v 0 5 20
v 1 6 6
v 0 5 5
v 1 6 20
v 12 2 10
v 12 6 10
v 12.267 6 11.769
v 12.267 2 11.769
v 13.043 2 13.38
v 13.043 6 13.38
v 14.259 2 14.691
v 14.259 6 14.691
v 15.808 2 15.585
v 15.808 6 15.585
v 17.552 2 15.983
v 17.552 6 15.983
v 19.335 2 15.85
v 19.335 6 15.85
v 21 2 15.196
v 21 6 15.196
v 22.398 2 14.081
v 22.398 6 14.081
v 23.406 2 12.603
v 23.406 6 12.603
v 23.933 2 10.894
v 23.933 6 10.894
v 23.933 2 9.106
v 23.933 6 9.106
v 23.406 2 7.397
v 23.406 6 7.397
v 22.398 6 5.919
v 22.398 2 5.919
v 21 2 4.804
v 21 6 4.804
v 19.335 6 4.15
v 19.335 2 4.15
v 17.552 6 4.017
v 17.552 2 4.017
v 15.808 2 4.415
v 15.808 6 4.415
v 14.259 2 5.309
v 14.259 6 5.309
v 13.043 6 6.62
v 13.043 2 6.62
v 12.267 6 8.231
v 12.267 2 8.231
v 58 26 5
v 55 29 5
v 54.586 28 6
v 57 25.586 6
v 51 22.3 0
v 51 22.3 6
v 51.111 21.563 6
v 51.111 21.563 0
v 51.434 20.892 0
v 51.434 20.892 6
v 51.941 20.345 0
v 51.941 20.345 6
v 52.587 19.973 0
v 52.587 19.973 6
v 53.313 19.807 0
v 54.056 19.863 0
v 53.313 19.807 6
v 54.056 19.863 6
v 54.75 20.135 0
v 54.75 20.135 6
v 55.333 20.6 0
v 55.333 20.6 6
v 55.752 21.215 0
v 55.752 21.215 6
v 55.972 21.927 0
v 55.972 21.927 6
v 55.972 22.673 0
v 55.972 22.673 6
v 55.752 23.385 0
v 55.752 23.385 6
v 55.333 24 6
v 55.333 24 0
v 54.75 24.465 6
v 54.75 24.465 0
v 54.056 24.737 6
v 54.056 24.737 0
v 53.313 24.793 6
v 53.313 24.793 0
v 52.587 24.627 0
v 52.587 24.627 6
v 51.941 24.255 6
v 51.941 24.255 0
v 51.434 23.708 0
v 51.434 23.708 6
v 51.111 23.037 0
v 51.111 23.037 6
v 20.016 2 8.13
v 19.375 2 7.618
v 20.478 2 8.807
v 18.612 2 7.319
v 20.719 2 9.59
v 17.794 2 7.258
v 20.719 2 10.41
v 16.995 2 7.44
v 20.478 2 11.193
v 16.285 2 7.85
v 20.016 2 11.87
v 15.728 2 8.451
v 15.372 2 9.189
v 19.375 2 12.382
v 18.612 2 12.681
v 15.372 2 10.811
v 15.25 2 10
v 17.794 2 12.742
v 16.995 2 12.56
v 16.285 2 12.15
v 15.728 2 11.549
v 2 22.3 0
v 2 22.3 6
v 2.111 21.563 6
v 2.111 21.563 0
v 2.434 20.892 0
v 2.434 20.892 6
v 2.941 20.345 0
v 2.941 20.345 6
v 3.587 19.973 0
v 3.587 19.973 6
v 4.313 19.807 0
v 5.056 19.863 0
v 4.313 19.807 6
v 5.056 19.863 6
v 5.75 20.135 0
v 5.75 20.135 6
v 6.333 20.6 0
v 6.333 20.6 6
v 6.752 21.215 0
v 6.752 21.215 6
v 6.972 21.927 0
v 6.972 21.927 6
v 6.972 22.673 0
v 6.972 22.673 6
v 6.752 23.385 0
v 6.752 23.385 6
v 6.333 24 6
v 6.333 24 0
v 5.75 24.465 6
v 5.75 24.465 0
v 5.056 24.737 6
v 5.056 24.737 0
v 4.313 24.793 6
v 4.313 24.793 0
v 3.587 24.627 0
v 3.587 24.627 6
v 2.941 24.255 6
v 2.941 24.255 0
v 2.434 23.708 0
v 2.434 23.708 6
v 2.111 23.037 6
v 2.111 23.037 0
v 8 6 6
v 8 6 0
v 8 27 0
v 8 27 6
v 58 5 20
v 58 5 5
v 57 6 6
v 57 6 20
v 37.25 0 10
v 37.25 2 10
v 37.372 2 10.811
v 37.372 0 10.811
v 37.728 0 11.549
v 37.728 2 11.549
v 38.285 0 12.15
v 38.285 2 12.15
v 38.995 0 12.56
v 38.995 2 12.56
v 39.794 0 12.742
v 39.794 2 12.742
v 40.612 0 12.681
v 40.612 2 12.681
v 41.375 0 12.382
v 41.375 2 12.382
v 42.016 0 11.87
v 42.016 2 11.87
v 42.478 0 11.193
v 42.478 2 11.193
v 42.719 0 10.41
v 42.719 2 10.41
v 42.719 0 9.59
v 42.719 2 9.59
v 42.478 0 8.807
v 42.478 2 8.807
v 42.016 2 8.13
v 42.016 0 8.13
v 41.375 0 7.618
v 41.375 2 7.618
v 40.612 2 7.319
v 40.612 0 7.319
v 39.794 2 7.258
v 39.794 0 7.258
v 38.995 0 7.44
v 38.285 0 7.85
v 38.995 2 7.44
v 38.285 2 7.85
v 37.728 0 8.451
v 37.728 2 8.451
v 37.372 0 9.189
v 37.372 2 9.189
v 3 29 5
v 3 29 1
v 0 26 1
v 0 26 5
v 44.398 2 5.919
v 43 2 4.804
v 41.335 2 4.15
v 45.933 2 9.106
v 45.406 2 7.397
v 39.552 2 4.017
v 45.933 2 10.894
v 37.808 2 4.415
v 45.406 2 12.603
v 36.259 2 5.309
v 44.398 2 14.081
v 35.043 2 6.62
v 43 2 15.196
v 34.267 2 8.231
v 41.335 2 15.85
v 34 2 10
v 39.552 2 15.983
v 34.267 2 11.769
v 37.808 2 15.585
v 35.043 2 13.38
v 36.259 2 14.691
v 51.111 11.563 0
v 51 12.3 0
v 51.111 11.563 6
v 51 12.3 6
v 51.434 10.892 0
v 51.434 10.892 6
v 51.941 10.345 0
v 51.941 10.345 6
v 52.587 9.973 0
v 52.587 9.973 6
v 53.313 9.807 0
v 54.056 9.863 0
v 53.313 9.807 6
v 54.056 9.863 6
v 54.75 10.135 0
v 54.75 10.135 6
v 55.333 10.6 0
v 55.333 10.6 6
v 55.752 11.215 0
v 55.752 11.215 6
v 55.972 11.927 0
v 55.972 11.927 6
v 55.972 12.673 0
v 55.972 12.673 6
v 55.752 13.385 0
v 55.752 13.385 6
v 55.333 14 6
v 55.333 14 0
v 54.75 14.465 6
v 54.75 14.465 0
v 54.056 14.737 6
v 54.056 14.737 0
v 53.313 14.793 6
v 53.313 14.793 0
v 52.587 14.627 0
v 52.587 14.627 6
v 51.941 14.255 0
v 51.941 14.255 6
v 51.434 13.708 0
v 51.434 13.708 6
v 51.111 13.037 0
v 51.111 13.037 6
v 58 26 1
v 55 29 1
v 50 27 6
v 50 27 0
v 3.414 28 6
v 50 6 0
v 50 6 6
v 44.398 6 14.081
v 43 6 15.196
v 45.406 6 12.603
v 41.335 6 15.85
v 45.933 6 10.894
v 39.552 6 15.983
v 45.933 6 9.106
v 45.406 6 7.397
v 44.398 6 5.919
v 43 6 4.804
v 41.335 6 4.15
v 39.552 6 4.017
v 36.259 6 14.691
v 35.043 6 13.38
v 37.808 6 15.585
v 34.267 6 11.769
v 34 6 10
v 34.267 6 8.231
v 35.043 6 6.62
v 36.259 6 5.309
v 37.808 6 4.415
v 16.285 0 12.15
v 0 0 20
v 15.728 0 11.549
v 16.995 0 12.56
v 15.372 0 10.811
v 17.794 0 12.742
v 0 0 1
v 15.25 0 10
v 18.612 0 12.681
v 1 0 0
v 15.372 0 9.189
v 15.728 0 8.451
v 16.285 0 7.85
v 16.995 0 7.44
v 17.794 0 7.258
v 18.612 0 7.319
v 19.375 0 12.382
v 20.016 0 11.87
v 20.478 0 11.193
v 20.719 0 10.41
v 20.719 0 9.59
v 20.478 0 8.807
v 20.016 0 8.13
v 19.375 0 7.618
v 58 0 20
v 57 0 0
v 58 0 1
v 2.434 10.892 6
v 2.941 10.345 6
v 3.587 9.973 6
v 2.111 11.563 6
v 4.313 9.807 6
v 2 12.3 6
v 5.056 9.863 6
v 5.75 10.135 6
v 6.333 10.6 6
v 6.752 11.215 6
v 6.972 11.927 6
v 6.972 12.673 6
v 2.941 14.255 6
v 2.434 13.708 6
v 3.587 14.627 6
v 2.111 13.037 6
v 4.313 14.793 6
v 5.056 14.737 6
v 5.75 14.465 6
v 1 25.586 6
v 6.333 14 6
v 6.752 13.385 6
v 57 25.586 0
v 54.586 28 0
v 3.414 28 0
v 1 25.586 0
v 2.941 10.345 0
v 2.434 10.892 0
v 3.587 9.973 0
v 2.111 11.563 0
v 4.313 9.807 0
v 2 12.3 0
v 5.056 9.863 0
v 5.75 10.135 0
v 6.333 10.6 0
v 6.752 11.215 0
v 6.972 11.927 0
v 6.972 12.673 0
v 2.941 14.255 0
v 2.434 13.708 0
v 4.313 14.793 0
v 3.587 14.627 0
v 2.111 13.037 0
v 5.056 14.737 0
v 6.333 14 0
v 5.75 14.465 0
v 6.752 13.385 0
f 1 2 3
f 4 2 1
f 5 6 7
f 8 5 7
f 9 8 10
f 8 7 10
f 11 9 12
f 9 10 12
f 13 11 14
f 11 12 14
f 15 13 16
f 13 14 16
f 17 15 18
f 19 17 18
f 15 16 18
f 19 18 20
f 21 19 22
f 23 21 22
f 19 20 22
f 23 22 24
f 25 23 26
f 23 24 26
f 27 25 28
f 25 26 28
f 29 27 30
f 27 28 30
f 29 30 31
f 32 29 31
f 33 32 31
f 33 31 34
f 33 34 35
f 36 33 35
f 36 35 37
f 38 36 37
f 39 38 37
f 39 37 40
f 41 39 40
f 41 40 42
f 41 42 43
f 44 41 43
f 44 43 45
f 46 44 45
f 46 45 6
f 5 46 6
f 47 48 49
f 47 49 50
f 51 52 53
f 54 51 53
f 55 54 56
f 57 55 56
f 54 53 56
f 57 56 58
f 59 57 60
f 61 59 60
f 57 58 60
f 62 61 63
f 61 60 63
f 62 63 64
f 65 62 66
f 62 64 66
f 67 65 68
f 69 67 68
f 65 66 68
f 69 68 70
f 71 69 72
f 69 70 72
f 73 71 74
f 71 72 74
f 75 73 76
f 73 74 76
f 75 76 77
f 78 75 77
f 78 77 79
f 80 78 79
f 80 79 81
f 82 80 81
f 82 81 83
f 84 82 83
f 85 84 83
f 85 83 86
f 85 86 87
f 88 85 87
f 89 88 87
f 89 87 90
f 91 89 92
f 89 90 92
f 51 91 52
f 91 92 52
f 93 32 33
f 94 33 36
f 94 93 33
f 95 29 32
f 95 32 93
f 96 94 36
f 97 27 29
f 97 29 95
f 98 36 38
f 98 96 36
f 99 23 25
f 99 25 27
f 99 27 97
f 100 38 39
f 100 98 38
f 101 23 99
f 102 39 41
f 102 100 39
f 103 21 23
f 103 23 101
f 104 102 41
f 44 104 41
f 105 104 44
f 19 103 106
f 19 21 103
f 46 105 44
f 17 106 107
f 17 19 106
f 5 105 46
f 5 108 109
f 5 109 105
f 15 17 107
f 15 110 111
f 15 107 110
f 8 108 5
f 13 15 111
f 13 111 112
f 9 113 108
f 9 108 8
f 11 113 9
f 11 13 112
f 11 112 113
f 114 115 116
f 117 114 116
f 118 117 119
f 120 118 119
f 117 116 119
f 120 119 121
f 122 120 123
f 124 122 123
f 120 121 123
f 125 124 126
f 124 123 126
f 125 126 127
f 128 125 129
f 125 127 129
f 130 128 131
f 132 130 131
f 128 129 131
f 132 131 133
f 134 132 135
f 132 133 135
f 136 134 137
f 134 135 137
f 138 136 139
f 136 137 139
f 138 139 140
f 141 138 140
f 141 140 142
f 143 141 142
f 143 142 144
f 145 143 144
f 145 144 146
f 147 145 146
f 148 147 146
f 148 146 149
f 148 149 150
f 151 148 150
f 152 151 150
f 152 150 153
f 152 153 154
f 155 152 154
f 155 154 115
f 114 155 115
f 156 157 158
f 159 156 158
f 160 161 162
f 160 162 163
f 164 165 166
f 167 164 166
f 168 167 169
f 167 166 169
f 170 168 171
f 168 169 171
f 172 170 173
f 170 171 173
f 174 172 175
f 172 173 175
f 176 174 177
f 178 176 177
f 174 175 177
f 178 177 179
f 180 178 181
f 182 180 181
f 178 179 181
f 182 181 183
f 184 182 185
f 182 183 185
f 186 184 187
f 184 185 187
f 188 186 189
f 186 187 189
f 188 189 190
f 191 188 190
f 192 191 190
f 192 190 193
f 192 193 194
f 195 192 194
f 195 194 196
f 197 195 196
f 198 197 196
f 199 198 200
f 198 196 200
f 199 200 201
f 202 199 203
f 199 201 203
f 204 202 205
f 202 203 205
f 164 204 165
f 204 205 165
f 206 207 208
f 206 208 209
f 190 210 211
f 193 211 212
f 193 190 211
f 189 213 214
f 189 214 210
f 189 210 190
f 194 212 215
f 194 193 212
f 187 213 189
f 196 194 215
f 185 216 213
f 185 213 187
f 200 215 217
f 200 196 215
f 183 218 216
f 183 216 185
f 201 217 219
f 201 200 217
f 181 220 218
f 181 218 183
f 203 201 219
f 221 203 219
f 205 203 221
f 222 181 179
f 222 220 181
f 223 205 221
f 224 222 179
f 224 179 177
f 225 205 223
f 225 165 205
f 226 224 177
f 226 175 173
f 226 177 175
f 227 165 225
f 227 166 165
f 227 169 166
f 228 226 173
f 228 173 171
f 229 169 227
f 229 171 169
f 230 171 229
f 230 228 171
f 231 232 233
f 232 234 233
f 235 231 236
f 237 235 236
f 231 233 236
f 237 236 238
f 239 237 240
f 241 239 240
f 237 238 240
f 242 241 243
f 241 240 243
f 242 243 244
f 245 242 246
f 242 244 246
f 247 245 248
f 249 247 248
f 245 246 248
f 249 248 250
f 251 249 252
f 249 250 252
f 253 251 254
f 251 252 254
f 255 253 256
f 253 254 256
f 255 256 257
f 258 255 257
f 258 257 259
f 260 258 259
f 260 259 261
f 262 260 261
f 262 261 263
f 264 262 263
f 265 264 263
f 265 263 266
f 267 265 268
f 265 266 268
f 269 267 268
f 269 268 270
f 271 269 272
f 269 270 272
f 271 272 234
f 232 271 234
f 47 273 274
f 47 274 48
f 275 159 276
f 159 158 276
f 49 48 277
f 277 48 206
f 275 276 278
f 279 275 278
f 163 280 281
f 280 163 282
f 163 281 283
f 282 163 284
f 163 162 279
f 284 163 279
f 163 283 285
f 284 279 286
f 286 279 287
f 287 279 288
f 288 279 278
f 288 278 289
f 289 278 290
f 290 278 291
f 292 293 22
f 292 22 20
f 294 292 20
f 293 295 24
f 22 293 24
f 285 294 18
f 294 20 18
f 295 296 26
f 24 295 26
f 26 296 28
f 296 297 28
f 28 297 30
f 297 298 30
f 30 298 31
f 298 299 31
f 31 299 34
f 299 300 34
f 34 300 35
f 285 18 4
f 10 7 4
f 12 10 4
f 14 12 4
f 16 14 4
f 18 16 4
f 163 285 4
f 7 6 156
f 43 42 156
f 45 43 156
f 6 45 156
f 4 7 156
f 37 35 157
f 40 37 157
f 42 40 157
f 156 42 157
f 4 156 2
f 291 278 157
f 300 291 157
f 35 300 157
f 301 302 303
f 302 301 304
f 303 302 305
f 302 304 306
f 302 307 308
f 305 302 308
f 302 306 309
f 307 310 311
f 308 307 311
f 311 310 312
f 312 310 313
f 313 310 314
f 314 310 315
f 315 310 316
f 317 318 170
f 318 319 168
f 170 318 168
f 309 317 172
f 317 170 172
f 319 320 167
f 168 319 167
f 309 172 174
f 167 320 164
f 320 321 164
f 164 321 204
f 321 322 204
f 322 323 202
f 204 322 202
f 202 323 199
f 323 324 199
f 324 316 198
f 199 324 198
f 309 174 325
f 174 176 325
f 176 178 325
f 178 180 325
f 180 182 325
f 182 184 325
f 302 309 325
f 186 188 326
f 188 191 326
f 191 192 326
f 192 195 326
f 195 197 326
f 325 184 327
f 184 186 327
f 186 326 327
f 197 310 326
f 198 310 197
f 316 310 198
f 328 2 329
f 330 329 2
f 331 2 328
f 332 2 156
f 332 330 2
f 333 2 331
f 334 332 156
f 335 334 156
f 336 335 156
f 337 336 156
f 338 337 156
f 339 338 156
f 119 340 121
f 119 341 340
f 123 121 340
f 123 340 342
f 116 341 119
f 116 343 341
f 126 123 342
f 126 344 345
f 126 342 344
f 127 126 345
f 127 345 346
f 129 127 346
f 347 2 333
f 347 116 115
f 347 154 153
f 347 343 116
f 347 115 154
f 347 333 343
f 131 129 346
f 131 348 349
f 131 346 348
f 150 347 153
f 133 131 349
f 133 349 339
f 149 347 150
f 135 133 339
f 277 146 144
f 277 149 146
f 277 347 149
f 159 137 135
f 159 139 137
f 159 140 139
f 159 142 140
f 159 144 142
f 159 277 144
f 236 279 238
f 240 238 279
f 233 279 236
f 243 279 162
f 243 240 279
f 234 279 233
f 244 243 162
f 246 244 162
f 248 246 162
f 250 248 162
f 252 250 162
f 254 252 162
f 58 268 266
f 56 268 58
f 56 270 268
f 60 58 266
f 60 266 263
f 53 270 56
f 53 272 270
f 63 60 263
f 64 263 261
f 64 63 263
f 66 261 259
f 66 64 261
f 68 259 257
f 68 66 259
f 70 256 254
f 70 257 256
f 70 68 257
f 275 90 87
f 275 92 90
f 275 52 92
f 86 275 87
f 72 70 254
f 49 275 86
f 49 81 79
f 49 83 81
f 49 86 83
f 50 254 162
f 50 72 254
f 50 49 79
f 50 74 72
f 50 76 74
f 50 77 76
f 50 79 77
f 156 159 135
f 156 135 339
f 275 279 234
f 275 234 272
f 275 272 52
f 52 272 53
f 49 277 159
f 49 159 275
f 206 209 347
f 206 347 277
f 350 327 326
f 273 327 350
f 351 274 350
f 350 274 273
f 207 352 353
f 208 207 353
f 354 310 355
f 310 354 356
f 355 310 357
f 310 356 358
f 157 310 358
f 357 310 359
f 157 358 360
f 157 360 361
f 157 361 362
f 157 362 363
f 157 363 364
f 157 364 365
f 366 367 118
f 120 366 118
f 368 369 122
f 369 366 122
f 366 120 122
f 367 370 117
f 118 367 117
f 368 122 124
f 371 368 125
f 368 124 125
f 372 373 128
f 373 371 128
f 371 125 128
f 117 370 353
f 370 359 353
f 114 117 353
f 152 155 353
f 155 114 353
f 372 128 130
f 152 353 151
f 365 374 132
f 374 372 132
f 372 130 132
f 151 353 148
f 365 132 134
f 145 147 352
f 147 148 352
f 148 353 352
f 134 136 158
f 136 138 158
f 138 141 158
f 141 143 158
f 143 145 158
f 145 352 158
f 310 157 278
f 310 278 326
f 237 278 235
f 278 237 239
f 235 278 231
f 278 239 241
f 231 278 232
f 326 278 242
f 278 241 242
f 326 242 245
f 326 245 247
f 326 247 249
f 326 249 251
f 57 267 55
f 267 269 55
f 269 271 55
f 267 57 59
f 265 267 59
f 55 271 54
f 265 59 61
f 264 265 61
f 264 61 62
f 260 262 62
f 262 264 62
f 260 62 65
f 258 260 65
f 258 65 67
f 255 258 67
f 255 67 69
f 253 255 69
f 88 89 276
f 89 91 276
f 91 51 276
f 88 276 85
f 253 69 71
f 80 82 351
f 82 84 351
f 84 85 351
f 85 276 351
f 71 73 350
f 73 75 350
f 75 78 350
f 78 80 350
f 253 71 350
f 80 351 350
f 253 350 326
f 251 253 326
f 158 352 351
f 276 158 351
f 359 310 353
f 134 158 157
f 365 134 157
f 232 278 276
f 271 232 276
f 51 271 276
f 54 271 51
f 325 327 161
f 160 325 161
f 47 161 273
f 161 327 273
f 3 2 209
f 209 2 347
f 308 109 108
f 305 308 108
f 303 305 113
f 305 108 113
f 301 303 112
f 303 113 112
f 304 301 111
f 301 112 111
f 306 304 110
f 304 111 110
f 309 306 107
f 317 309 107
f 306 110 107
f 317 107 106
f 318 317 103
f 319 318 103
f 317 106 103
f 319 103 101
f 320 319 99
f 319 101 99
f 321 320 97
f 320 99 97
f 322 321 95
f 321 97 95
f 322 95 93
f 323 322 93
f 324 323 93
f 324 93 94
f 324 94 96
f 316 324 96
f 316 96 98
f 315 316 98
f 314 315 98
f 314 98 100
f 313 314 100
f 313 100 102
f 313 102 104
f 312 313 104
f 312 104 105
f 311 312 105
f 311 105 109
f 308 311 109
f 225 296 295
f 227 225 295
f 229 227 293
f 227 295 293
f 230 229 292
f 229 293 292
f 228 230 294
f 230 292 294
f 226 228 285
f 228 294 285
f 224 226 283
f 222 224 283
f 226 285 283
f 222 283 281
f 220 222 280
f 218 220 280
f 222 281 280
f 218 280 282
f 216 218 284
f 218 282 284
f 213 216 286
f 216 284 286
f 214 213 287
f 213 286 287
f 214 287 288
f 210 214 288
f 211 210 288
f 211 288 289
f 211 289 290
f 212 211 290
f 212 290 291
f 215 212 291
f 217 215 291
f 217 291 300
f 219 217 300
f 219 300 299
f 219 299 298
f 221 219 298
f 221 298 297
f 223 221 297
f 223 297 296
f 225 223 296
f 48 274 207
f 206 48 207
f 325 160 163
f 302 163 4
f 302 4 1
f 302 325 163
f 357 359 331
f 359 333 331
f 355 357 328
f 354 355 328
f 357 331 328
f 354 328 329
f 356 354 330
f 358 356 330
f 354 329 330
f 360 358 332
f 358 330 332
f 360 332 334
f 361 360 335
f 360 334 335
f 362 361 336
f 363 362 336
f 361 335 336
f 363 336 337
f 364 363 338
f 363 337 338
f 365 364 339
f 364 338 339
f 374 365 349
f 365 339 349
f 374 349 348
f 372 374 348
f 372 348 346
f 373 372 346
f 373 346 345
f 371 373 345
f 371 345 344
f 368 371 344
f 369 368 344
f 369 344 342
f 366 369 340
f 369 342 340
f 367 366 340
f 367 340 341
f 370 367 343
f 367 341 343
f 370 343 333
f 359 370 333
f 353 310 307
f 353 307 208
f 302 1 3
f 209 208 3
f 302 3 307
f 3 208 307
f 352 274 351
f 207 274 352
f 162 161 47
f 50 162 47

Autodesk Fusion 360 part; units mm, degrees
sketch "Sketch1" plane through (0, 0, 0) normal (0, 0, 1) x (1, 0, 0) in component "Servohalterung"
  line L0 (0, 0) -> (58, 0)
  line L1 (58, 0) -> (58, 29)
  line L2 (58, 29) -> (0, 29)
  line L3 (0, 29) -> (0, 0)
  line L4 (8, 27) -> (50, 27)
  line L5 (50, 27) -> (50, 6)
  line L6 (50, 6) -> (8, 6)
  line L7 (8, 6) -> (8, 27)
  dimension "d22" = 8
  dimension "d23" = 8
  dimension "d24" = 42
  dimension "d25" = 2
  dimension "d26" = 6
  dimension "d27" = 21
extrude "Extrude1" add sketch "Sketch1" along normal blind 6 in component "Servohalterung"
sketch "Sketch2" plane through (0, 0, 6) normal (0, 0, 1) x (-1, 0, 0) in component "Servohalterung"
  line L0 (-50, -6) -> (-8, -6)
  line L1 (-8, -6) -> (-8, -27)
  line L2 (-8, -27) -> (-50, -27)
  line L3 (-50, -27) -> (-50, -6)
  line L4 (0, -29) -> (0, 0)
  line L5 (0, 0) -> (-58, 0)
  line L6 (-58, 0) -> (-58, -29)
  line L7 (-58, -29) -> (0, -29)
  line L8 (0, 0) -> (-58, 0)
  line L9 (-58, 0) -> (-58, -6)
  line L10 (-58, -6) -> (0, -6)
  line L11 (0, -6) -> (0, 0)
  line L12 (-50, -6) -> (-8, -6)
extrude "Extrude2" add sketch "Sketch2" along normal blind 14 contours L0 L4 L5 L6 L8 L9 L10 L11 L12 in component "Servohalterung"
sketch "Sketch3" plane through (0, 6, 0) normal (0, 1, 0) x (-1, 0, 0) in component "Servohalterung"
  line L0 (-8, 0) -> (-8, 6)
  line L1 (-8, 6) -> (0, 6)
  line L2 (0, 6) -> (0, 20)
  line L3 (0, 20) -> (-58, 20)
  line L4 (-58, 20) -> (-58, 6)
  line L5 (-58, 6) -> (-50, 6)
  line L6 (-50, 6) -> (-50, 0)
  line L7 (-50, 0) -> (-8, 0)
  circle A0 centre (-40, 10) radius 6
  line L8 (-29, 0) -> (-29, 20)
  circle A1 centre (-18, 10) radius 6
  dimension "d34" = 12
  dimension "d38" = 10
  dimension "d64" = 10
extrude "Extrude3" cut sketch "Sketch3" against normal blind 4 contours A0 | A1 in component "Servohalterung"
sketch "Sketch4" plane through (0, 2, 0) normal (0, 1, 0) x (-1, 0, 0) in component "Servohalterung"
  circle A0 centre (-40, 10) radius 6
  circle A1 centre (-40, 10) radius 2.75
  line L0 (-28.3646, -4) -> (-28.3646, 24)
  circle A2 centre (-18, 10) radius 2.75
  circle A3 centre (-18, 10) radius 6
  line L1 (-58, 20) -> (0, 20)
  dimension "d42" = 5.5
  dimension "d43" = 5.5
extrude "Extrude4" cut sketch "Sketch4" against normal up to surface (2 mm away) contours A1 | A2 in component "Servohalterung"
sketch "Sketch5" plane through (0, 0, 6) normal (0, 0, 1) x (-1, 0, 0) in component "Servohalterung"
  line L0 (0, -6) -> (-8, -6)
  line L1 (-8, -6) -> (-8, -27)
  line L2 (-8, -27) -> (-50, -27)
  line L3 (-50, -27) -> (-50, -6)
  line L4 (-50, -6) -> (-58, -6)
  line L5 (-58, -6) -> (-58, -29)
  line L6 (-58, -29) -> (0, -29)
  line L7 (0, -29) -> (0, -6)
  circle A0 centre (-4.5, -22.3) radius 2.5
  circle A1 centre (-4.5, -12.3) radius 2.5
  circle A2 centre (-53.5, -22.3) radius 2.5
  circle A3 centre (-53.5, -12.3) radius 2.5
  dimension "d46" = 5
  dimension "d48" = 2.2
  dimension "d49" = 1
  dimension "d50" = 5
  dimension "d51" = 5
  dimension "d52" = 5
  dimension "d53" = 5
  dimension "d54" = 5
  dimension "d57" = 1
extrude "Extrude5" cut sketch "Sketch5" against normal up to surface (6 mm away) contours A0 | A1 | A2 | A3 in component "Servohalterung"
chamfer "Chamfer3" distance 3 angle 45 2 edges at (58, 29, 3) (0, 29, 3) in component "Servohalterung"
chamfer "Chamfer1" distance 1 angle 45 12 edges at (58, 13, 0) (58, 16, 6) (29, 29, 6) (29, 29, 0) (0, 13, 0) (0, 16, 6) (1.5, 27.5, 0) (1.5, 27.5, 6) (56.5, 27.5, 0) (56.5, 27.5, 6) (0, 6, 13) (58, 6, 13) in component "Servohalterung"
component "Servohalterung" placed x (1, 0, 0) y (0, 1, 0) z (0, 0, 1) at (0, 0, 0)
